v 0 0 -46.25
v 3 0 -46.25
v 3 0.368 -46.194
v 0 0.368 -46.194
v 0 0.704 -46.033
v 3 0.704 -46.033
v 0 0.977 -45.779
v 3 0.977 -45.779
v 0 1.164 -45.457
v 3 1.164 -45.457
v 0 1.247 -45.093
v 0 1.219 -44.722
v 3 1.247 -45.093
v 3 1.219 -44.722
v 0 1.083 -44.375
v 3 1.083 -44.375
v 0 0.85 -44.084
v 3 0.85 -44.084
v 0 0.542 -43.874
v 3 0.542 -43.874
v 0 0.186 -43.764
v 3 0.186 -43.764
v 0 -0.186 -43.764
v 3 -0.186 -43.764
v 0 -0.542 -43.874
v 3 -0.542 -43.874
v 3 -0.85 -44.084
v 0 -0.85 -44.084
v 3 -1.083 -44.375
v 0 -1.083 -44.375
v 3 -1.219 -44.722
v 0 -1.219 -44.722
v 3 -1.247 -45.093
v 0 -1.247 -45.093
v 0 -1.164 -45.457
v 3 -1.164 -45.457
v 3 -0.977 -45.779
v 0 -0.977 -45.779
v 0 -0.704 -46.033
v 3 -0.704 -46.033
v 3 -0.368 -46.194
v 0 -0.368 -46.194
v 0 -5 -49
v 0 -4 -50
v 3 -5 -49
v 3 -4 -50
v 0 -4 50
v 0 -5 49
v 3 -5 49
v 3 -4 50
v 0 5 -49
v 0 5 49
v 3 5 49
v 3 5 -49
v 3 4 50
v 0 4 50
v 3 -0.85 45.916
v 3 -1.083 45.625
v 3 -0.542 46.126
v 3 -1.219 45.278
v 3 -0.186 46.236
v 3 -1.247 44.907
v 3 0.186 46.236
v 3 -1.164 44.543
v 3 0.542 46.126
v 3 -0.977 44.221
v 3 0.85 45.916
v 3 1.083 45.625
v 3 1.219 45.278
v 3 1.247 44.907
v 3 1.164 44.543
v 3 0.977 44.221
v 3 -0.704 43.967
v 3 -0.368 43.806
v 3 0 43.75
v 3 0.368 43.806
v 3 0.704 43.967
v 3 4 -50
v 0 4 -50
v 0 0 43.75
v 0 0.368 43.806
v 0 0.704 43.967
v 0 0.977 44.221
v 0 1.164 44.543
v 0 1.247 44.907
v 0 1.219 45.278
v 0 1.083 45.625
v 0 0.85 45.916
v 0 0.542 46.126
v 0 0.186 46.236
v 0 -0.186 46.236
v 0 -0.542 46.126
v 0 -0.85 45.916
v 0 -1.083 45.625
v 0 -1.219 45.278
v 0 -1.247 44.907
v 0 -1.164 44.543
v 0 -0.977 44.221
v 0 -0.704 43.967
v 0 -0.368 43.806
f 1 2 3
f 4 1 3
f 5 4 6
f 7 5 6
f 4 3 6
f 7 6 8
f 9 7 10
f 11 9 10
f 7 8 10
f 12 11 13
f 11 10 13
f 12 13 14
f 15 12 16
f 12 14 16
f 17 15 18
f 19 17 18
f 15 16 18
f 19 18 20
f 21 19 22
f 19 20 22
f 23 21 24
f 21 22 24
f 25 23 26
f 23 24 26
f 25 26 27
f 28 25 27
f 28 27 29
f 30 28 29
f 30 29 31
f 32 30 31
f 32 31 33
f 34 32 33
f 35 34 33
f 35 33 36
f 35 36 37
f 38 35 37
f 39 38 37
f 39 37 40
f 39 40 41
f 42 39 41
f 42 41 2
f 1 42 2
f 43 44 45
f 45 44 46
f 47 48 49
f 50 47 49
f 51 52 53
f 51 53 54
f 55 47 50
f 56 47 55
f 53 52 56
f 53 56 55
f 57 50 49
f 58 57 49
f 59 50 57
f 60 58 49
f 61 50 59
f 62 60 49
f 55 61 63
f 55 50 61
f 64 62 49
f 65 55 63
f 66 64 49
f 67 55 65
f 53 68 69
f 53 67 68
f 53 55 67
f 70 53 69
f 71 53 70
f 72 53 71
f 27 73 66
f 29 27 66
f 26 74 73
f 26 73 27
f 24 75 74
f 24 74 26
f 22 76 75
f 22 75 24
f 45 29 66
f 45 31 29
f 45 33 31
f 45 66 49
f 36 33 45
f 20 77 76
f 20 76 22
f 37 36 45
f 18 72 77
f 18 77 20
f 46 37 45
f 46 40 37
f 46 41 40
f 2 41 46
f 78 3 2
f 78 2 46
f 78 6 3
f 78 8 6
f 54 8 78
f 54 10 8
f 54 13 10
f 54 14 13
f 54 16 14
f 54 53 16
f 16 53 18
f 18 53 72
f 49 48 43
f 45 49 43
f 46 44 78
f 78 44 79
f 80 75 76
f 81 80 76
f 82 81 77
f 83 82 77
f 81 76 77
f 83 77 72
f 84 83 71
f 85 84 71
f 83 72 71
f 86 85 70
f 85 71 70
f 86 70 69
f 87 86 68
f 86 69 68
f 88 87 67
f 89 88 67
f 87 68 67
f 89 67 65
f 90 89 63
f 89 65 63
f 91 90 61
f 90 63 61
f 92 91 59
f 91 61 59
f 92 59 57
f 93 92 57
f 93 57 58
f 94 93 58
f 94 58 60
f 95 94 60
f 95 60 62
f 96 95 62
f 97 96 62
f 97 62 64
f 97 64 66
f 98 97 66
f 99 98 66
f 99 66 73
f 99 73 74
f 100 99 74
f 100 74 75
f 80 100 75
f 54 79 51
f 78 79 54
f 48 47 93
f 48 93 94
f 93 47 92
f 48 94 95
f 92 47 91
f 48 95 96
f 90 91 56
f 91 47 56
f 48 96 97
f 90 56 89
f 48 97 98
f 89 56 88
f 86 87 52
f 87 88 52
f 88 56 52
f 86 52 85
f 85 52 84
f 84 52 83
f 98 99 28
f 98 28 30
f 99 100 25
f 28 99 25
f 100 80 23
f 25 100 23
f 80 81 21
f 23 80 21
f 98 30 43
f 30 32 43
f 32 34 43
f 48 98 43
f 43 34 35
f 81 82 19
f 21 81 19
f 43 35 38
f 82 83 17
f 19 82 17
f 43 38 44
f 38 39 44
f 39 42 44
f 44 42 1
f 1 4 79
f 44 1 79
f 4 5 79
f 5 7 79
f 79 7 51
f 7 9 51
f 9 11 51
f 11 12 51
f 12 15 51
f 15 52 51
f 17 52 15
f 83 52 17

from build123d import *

# Parameters (mm, degrees)
SKETCH_1_W          = 100
SKETCH_1_H          = 10
EXTRUDE_1_DEPTH     = 3
SKETCH_2_R          = 1.25
CUT_EXTRUDE_1_DEPTH = 51.338851795
CHAMFER_1_SIZE      = 1


with BuildPart() as part:
    # 草图1 → 凸台-拉伸1 (new body)
    with BuildSketch(Plane(origin=(0, 0, 0), x_dir=(0, 0, -1), z_dir=(1, 0, 0))):
        Rectangle(SKETCH_1_W, SKETCH_1_H)
    extrude(amount=EXTRUDE_1_DEPTH)

    # 草图2 → 切除-拉伸1 (cut, through all)
    with BuildSketch(Plane(origin=(3, 0, 0), x_dir=(0, 0, -1), z_dir=(1, 0, 0))):
        with Locations((-45, 0)):
            Circle(SKETCH_2_R)
        with Locations((45, 0)):
            Circle(SKETCH_2_R)
    extrude(amount=-CUT_EXTRUDE_1_DEPTH, mode=Mode.SUBTRACT)

    # 倒角1
    chamfer_1_edges = [part.edges().sort_by_distance(p)[0] for p in [
        (1.5, 5, 50),
        (1.5, 5, -50),
        (1.5, -5, -50),
        (1.5, -5, 50),
    ]]
    chamfer(chamfer_1_edges, length=CHAMFER_1_SIZE)


solid = part.part
